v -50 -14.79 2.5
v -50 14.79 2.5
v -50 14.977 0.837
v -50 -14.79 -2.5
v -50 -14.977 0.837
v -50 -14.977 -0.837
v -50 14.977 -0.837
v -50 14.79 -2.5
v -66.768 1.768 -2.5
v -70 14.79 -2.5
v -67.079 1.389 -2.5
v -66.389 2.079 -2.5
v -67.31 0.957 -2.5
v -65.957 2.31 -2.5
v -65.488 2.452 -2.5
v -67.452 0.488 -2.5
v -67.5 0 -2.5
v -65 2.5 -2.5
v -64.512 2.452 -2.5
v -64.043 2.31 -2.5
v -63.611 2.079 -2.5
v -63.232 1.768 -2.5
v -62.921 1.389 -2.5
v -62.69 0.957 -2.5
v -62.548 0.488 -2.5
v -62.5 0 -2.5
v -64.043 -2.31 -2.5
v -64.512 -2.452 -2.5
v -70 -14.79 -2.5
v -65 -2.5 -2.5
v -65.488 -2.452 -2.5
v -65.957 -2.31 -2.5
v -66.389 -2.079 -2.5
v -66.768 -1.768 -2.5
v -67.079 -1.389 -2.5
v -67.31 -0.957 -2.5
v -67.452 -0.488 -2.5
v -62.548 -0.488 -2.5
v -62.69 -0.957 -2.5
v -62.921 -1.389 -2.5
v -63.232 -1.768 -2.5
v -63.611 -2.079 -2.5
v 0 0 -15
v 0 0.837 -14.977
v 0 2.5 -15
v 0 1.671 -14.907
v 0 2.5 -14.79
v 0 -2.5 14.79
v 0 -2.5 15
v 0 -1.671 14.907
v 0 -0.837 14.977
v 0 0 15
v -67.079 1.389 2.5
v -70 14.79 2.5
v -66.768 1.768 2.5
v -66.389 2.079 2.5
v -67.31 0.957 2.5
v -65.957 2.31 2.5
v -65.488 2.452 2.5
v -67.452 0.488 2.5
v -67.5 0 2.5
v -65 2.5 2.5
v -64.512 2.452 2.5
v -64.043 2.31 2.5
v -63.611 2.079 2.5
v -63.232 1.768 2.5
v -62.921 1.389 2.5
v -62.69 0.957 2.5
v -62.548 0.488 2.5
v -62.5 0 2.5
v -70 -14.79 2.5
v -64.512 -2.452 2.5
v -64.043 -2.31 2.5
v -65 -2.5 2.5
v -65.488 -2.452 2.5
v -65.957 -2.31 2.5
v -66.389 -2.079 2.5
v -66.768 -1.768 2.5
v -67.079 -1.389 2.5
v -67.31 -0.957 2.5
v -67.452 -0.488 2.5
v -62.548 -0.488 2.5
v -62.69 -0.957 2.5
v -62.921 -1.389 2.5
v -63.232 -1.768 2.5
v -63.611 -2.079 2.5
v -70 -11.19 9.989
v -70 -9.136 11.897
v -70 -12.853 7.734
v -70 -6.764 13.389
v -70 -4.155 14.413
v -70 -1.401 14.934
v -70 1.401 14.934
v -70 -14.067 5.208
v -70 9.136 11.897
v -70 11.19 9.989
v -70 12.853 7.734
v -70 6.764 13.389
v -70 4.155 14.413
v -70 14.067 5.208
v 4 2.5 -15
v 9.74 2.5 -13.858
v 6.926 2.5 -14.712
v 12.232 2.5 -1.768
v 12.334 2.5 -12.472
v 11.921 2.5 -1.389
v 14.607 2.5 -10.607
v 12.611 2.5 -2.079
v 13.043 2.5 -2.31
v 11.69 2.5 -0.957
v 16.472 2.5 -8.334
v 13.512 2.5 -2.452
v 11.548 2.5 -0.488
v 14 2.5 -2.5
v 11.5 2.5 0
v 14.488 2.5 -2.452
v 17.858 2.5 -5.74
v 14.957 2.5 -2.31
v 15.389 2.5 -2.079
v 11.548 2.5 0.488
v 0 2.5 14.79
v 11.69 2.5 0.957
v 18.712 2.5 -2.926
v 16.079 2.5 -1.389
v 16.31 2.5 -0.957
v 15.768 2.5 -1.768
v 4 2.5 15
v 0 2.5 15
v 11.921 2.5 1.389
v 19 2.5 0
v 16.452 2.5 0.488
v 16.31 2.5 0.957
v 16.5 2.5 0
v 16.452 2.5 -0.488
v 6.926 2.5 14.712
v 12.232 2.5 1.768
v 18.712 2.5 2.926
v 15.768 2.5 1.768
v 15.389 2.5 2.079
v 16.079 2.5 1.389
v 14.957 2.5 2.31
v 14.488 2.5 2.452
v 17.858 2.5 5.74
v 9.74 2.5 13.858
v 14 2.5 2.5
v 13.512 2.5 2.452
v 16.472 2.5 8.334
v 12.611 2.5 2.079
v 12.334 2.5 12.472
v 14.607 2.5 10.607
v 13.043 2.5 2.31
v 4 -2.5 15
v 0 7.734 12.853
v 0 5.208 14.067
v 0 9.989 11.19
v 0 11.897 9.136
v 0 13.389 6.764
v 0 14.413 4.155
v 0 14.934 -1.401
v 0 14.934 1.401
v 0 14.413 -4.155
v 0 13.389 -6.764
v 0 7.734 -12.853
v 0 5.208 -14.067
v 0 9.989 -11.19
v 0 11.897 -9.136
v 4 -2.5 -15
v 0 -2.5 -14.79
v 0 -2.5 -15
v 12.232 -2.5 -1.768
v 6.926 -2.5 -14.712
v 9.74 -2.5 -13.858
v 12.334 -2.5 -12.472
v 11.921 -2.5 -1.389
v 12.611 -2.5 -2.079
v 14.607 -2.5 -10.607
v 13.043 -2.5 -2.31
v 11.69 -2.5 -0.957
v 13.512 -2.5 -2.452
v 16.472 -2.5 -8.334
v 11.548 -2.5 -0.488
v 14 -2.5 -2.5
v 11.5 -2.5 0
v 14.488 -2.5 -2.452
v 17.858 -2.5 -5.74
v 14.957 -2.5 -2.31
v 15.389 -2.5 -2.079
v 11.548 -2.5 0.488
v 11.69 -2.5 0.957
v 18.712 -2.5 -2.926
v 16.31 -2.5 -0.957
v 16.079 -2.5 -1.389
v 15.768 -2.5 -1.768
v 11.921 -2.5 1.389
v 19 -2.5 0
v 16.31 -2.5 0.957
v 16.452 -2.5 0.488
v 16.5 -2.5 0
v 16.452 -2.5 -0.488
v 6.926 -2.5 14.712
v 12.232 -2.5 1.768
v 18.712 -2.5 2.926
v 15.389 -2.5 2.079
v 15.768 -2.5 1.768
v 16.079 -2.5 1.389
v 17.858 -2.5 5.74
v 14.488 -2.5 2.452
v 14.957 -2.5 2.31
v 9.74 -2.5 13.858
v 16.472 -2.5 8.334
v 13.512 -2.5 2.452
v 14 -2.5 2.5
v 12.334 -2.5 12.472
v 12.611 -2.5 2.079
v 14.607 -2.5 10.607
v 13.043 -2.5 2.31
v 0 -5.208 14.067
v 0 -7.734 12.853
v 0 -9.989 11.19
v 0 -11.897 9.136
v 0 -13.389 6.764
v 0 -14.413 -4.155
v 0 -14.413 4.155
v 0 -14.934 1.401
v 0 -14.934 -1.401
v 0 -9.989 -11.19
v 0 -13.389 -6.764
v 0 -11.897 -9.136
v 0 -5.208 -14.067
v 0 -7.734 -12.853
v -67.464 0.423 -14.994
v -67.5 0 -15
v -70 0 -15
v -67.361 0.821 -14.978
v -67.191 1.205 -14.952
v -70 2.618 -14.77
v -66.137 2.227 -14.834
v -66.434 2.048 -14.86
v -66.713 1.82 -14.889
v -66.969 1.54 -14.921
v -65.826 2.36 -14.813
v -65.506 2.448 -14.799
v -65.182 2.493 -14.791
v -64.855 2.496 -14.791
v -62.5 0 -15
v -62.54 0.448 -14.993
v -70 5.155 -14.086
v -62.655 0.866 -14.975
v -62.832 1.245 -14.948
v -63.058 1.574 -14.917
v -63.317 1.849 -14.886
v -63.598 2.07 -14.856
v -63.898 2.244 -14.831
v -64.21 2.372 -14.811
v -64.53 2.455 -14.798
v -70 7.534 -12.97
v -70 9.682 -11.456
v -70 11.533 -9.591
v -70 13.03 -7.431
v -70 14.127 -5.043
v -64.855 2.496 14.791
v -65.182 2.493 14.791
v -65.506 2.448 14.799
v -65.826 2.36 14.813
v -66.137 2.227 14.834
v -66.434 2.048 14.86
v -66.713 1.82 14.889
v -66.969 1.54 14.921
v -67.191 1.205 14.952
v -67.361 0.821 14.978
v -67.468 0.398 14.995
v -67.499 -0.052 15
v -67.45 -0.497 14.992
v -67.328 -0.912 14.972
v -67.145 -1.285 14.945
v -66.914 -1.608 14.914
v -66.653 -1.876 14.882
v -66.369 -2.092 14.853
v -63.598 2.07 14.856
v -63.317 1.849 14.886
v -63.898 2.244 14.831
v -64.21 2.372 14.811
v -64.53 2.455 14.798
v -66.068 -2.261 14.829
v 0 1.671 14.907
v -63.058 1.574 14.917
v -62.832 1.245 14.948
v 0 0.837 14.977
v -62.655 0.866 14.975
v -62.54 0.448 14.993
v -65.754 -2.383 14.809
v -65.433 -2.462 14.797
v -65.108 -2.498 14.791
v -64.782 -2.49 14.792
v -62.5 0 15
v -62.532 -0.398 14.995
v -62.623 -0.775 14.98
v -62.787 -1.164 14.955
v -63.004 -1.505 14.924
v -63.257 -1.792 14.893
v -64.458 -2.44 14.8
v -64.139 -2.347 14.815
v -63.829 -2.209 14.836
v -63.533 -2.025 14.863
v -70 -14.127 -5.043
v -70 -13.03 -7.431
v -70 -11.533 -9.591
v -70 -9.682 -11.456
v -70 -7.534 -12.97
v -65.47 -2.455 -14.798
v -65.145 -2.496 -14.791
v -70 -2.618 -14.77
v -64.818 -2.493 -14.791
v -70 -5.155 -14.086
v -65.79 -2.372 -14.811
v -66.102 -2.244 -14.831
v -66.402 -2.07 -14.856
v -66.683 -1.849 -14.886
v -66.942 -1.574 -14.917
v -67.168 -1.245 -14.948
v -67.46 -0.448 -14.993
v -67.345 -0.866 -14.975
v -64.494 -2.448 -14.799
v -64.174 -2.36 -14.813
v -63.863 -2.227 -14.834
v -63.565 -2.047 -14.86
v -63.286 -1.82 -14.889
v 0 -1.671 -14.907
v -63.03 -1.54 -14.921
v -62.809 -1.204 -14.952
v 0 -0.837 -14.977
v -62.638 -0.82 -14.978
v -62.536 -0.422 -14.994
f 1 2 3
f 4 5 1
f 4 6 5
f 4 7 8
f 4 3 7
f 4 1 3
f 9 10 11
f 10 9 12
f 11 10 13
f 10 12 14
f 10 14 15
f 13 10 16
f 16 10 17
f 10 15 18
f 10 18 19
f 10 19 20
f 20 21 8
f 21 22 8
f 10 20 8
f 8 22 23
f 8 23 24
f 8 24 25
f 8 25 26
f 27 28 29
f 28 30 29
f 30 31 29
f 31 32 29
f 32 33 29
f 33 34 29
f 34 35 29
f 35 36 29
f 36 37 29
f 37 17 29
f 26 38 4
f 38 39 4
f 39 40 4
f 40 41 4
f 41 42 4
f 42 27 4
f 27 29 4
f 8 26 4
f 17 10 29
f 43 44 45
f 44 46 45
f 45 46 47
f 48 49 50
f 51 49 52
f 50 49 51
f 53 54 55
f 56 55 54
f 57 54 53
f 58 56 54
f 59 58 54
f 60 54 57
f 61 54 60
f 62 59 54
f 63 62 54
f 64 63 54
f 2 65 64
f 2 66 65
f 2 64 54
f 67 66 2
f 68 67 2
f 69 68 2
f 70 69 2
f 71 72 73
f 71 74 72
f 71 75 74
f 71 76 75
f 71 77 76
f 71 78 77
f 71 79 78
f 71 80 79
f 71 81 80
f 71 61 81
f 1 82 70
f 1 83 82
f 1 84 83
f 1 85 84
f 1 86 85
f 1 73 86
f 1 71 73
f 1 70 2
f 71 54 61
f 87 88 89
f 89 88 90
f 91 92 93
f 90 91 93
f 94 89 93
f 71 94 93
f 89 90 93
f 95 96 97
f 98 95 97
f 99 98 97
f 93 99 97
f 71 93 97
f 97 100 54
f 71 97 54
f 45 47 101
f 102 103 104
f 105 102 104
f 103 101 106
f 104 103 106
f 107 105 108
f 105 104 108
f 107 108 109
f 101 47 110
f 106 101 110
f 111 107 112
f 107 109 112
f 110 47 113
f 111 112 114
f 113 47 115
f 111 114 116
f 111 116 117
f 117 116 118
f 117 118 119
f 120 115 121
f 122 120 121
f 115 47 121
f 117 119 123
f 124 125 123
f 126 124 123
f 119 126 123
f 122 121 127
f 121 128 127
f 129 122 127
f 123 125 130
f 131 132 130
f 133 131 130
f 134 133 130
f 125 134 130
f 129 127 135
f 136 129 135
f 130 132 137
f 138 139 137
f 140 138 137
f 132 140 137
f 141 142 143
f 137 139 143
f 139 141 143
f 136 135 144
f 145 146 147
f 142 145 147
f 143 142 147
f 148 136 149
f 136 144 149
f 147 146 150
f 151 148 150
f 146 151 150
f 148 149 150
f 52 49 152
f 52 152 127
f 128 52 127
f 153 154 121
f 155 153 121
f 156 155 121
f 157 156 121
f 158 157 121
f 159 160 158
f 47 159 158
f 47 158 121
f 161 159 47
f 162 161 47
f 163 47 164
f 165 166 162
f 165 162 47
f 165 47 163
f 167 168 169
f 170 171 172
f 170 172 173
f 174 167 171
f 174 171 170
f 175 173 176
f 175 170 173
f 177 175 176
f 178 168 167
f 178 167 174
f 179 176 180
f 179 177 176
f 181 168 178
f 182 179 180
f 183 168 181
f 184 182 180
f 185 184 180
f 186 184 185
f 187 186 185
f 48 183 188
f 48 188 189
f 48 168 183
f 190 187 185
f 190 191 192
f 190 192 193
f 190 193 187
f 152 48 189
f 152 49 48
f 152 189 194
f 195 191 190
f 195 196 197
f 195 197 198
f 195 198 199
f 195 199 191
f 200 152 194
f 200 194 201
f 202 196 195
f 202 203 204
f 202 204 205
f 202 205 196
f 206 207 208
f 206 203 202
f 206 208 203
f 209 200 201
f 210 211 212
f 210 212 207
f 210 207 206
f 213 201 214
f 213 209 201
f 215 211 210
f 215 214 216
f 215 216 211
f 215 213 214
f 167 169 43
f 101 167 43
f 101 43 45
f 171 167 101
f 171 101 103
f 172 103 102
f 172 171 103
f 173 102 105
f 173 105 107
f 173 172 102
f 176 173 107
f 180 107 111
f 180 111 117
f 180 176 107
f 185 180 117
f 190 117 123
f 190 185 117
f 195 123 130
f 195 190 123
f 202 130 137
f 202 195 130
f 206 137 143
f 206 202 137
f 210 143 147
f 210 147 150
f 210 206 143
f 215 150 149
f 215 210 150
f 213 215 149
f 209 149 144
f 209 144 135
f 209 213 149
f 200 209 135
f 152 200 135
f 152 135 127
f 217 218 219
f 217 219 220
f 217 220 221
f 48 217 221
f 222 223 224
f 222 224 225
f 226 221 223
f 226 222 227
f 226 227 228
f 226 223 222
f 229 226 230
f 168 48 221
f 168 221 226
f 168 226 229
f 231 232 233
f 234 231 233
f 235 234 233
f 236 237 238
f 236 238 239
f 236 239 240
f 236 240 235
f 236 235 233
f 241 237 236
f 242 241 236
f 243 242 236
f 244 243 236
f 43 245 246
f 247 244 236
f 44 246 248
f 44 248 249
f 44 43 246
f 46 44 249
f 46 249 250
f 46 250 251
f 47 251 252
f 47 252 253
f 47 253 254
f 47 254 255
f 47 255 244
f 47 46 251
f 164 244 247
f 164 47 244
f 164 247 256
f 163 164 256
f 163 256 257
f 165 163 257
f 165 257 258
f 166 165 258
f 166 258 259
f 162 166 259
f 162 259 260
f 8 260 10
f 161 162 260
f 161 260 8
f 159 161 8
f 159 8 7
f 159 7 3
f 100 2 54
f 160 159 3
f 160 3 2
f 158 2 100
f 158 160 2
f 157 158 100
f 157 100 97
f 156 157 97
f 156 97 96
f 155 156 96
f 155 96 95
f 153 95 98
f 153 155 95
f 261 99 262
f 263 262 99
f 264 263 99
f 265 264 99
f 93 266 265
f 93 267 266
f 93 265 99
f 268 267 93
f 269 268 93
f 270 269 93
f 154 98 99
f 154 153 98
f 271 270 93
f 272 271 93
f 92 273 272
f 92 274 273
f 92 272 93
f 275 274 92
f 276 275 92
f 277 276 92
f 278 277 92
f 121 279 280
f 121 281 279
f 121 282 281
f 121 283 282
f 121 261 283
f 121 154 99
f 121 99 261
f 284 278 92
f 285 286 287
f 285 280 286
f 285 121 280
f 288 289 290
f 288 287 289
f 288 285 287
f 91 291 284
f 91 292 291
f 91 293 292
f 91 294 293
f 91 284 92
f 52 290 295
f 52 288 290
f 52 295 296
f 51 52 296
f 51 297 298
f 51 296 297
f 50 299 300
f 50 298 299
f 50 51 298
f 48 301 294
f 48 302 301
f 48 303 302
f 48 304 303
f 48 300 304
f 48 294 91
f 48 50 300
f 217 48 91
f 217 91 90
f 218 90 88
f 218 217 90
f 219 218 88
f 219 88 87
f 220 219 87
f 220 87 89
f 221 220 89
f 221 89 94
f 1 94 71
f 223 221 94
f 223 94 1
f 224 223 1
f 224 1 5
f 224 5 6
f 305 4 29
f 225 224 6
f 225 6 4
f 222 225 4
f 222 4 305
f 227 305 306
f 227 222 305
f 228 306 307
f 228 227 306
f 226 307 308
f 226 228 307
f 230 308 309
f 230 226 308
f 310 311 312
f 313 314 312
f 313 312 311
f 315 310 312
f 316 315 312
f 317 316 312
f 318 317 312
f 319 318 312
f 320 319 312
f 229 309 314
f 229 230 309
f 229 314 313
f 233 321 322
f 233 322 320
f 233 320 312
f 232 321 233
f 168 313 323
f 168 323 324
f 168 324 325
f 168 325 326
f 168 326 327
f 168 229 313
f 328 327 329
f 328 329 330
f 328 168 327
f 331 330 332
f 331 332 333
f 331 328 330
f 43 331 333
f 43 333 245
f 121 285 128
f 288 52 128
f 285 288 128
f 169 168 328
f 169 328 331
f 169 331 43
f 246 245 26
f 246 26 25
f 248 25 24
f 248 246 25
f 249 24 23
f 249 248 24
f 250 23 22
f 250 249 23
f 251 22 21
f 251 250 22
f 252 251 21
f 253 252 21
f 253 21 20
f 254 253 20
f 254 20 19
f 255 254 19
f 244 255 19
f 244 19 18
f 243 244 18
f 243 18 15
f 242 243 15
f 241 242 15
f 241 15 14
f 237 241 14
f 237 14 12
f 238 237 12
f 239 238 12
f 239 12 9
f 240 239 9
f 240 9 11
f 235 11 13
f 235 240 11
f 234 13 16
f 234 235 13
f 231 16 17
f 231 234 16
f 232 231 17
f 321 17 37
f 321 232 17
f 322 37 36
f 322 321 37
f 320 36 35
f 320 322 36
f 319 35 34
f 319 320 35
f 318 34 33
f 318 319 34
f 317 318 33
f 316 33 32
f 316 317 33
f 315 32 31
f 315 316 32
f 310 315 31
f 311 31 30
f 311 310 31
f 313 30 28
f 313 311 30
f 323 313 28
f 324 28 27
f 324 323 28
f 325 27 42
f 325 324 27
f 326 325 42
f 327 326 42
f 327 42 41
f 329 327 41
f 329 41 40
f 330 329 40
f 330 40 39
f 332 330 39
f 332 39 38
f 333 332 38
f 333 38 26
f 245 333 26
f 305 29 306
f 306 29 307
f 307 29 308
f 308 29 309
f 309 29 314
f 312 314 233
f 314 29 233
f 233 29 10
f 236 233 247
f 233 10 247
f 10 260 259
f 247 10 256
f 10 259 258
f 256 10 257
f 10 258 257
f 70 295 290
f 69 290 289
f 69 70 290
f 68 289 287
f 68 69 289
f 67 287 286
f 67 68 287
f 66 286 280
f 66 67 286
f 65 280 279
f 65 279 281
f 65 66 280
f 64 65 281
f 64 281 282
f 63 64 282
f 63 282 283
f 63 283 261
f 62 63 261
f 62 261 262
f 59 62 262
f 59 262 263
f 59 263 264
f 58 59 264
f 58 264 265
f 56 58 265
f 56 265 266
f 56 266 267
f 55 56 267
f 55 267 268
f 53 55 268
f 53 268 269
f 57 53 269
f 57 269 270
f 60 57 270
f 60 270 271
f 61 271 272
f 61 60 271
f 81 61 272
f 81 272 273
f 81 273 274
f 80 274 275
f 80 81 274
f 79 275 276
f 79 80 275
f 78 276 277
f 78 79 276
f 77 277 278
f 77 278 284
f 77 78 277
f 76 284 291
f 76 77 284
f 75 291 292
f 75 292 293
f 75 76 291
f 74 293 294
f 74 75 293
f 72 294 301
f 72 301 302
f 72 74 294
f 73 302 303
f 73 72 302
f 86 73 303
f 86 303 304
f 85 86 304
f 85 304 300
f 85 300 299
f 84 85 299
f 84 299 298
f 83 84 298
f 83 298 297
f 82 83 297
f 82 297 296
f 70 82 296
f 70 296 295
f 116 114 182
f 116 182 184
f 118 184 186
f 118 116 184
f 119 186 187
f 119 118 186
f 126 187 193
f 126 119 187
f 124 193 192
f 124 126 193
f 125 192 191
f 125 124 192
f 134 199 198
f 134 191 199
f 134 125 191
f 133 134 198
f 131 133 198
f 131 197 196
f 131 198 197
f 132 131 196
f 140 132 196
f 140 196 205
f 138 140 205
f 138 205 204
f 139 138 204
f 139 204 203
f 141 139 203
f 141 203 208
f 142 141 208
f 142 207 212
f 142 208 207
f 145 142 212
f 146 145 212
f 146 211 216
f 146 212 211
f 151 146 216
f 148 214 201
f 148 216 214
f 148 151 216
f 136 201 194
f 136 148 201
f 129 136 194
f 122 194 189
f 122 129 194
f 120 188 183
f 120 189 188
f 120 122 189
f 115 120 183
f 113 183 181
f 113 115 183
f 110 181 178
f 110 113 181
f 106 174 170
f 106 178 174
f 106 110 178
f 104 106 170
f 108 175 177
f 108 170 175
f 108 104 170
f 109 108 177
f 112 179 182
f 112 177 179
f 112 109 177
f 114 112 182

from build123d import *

# Parameters (mm, degrees)
SKETCH2_R               = 15
BOSS_EXTRUDE1_DEPTH     = 70
CUT_EXTRUDE1_DEPTH      = 74.143694192
CUT_EXTRUDE1_DEPTH_BACK = 74.143694192
SKETCH3_W               = 20
SKETCH3_H               = 5
CUT_EXTRUDE2_DEPTH      = 74.143694192
CUT_EXTRUDE2_DEPTH_BACK = 74.143694192
SKETCH6_R               = 2.5
SKETCH7_W               = 5
SKETCH7_H               = 30
BOSS_EXTRUDE2_DEPTH     = 4
BOSS_EXTRUDE3_DEPTH     = 5
CUT_EXTRUDE3_DEPTH      = 74.697015004
CUT_EXTRUDE3_DEPTH_BACK = 74.697015004
SKETCH9_R               = 2.5


with BuildPart() as part:
    # Sketch2 → Boss-Extrude1 (new body)
    with BuildSketch(Plane(origin=(0, 0, 0), x_dir=(0, 0, -1), z_dir=(1, 0, 0))):
        Circle(SKETCH2_R)
    extrude(amount=-BOSS_EXTRUDE1_DEPTH)

    # Sketch3 → Cut-Extrude1 (cut, two sides: drawn at the far end of the back side and taken through both)
    with BuildSketch(Plane(origin=(0, 0, 0), x_dir=(1, 0, 0), z_dir=(0, 1, 0)).offset(-CUT_EXTRUDE1_DEPTH_BACK)):
        with Locations((-60, 0)):
            Rectangle(SKETCH3_W, SKETCH3_H)
    extrude(amount=CUT_EXTRUDE1_DEPTH + CUT_EXTRUDE1_DEPTH_BACK, mode=Mode.SUBTRACT)

    # Sketch6 → Cut-Extrude2 (cut, two sides: drawn at the far end of the back side and taken through both)
    with BuildSketch(Plane.XY.offset(-CUT_EXTRUDE2_DEPTH_BACK)):
        with Locations((-65, 0)):
            Circle(SKETCH6_R)
    extrude(amount=CUT_EXTRUDE2_DEPTH + CUT_EXTRUDE2_DEPTH_BACK, mode=Mode.SUBTRACT)

    # Sketch7 → Boss-Extrude2 (add)
    with BuildSketch(Plane.YZ):
        Rectangle(SKETCH7_W, SKETCH7_H)
    extrude(amount=BOSS_EXTRUDE2_DEPTH)

    # Sketch8 → Boss-Extrude3 (add)
    with BuildSketch(Plane.XZ.offset(2.5)):
        with BuildLine():
            Line((4, 15), (4, -15))
            ThreePointArc((4, -15), (19, 0), (4, 15))
        make_face()
    extrude(amount=-BOSS_EXTRUDE3_DEPTH)

    # Sketch9 → Cut-Extrude3 (cut, two sides: drawn at the far end of the back side and taken through both)
    with BuildSketch(Plane.XZ.offset(2.5).offset(-CUT_EXTRUDE3_DEPTH_BACK)):
        with Locations(Location((14, 0, 0), (0, 0, 270))):
            Circle(SKETCH9_R)
    extrude(amount=CUT_EXTRUDE3_DEPTH + CUT_EXTRUDE3_DEPTH_BACK, mode=Mode.SUBTRACT)


solid = part.part
